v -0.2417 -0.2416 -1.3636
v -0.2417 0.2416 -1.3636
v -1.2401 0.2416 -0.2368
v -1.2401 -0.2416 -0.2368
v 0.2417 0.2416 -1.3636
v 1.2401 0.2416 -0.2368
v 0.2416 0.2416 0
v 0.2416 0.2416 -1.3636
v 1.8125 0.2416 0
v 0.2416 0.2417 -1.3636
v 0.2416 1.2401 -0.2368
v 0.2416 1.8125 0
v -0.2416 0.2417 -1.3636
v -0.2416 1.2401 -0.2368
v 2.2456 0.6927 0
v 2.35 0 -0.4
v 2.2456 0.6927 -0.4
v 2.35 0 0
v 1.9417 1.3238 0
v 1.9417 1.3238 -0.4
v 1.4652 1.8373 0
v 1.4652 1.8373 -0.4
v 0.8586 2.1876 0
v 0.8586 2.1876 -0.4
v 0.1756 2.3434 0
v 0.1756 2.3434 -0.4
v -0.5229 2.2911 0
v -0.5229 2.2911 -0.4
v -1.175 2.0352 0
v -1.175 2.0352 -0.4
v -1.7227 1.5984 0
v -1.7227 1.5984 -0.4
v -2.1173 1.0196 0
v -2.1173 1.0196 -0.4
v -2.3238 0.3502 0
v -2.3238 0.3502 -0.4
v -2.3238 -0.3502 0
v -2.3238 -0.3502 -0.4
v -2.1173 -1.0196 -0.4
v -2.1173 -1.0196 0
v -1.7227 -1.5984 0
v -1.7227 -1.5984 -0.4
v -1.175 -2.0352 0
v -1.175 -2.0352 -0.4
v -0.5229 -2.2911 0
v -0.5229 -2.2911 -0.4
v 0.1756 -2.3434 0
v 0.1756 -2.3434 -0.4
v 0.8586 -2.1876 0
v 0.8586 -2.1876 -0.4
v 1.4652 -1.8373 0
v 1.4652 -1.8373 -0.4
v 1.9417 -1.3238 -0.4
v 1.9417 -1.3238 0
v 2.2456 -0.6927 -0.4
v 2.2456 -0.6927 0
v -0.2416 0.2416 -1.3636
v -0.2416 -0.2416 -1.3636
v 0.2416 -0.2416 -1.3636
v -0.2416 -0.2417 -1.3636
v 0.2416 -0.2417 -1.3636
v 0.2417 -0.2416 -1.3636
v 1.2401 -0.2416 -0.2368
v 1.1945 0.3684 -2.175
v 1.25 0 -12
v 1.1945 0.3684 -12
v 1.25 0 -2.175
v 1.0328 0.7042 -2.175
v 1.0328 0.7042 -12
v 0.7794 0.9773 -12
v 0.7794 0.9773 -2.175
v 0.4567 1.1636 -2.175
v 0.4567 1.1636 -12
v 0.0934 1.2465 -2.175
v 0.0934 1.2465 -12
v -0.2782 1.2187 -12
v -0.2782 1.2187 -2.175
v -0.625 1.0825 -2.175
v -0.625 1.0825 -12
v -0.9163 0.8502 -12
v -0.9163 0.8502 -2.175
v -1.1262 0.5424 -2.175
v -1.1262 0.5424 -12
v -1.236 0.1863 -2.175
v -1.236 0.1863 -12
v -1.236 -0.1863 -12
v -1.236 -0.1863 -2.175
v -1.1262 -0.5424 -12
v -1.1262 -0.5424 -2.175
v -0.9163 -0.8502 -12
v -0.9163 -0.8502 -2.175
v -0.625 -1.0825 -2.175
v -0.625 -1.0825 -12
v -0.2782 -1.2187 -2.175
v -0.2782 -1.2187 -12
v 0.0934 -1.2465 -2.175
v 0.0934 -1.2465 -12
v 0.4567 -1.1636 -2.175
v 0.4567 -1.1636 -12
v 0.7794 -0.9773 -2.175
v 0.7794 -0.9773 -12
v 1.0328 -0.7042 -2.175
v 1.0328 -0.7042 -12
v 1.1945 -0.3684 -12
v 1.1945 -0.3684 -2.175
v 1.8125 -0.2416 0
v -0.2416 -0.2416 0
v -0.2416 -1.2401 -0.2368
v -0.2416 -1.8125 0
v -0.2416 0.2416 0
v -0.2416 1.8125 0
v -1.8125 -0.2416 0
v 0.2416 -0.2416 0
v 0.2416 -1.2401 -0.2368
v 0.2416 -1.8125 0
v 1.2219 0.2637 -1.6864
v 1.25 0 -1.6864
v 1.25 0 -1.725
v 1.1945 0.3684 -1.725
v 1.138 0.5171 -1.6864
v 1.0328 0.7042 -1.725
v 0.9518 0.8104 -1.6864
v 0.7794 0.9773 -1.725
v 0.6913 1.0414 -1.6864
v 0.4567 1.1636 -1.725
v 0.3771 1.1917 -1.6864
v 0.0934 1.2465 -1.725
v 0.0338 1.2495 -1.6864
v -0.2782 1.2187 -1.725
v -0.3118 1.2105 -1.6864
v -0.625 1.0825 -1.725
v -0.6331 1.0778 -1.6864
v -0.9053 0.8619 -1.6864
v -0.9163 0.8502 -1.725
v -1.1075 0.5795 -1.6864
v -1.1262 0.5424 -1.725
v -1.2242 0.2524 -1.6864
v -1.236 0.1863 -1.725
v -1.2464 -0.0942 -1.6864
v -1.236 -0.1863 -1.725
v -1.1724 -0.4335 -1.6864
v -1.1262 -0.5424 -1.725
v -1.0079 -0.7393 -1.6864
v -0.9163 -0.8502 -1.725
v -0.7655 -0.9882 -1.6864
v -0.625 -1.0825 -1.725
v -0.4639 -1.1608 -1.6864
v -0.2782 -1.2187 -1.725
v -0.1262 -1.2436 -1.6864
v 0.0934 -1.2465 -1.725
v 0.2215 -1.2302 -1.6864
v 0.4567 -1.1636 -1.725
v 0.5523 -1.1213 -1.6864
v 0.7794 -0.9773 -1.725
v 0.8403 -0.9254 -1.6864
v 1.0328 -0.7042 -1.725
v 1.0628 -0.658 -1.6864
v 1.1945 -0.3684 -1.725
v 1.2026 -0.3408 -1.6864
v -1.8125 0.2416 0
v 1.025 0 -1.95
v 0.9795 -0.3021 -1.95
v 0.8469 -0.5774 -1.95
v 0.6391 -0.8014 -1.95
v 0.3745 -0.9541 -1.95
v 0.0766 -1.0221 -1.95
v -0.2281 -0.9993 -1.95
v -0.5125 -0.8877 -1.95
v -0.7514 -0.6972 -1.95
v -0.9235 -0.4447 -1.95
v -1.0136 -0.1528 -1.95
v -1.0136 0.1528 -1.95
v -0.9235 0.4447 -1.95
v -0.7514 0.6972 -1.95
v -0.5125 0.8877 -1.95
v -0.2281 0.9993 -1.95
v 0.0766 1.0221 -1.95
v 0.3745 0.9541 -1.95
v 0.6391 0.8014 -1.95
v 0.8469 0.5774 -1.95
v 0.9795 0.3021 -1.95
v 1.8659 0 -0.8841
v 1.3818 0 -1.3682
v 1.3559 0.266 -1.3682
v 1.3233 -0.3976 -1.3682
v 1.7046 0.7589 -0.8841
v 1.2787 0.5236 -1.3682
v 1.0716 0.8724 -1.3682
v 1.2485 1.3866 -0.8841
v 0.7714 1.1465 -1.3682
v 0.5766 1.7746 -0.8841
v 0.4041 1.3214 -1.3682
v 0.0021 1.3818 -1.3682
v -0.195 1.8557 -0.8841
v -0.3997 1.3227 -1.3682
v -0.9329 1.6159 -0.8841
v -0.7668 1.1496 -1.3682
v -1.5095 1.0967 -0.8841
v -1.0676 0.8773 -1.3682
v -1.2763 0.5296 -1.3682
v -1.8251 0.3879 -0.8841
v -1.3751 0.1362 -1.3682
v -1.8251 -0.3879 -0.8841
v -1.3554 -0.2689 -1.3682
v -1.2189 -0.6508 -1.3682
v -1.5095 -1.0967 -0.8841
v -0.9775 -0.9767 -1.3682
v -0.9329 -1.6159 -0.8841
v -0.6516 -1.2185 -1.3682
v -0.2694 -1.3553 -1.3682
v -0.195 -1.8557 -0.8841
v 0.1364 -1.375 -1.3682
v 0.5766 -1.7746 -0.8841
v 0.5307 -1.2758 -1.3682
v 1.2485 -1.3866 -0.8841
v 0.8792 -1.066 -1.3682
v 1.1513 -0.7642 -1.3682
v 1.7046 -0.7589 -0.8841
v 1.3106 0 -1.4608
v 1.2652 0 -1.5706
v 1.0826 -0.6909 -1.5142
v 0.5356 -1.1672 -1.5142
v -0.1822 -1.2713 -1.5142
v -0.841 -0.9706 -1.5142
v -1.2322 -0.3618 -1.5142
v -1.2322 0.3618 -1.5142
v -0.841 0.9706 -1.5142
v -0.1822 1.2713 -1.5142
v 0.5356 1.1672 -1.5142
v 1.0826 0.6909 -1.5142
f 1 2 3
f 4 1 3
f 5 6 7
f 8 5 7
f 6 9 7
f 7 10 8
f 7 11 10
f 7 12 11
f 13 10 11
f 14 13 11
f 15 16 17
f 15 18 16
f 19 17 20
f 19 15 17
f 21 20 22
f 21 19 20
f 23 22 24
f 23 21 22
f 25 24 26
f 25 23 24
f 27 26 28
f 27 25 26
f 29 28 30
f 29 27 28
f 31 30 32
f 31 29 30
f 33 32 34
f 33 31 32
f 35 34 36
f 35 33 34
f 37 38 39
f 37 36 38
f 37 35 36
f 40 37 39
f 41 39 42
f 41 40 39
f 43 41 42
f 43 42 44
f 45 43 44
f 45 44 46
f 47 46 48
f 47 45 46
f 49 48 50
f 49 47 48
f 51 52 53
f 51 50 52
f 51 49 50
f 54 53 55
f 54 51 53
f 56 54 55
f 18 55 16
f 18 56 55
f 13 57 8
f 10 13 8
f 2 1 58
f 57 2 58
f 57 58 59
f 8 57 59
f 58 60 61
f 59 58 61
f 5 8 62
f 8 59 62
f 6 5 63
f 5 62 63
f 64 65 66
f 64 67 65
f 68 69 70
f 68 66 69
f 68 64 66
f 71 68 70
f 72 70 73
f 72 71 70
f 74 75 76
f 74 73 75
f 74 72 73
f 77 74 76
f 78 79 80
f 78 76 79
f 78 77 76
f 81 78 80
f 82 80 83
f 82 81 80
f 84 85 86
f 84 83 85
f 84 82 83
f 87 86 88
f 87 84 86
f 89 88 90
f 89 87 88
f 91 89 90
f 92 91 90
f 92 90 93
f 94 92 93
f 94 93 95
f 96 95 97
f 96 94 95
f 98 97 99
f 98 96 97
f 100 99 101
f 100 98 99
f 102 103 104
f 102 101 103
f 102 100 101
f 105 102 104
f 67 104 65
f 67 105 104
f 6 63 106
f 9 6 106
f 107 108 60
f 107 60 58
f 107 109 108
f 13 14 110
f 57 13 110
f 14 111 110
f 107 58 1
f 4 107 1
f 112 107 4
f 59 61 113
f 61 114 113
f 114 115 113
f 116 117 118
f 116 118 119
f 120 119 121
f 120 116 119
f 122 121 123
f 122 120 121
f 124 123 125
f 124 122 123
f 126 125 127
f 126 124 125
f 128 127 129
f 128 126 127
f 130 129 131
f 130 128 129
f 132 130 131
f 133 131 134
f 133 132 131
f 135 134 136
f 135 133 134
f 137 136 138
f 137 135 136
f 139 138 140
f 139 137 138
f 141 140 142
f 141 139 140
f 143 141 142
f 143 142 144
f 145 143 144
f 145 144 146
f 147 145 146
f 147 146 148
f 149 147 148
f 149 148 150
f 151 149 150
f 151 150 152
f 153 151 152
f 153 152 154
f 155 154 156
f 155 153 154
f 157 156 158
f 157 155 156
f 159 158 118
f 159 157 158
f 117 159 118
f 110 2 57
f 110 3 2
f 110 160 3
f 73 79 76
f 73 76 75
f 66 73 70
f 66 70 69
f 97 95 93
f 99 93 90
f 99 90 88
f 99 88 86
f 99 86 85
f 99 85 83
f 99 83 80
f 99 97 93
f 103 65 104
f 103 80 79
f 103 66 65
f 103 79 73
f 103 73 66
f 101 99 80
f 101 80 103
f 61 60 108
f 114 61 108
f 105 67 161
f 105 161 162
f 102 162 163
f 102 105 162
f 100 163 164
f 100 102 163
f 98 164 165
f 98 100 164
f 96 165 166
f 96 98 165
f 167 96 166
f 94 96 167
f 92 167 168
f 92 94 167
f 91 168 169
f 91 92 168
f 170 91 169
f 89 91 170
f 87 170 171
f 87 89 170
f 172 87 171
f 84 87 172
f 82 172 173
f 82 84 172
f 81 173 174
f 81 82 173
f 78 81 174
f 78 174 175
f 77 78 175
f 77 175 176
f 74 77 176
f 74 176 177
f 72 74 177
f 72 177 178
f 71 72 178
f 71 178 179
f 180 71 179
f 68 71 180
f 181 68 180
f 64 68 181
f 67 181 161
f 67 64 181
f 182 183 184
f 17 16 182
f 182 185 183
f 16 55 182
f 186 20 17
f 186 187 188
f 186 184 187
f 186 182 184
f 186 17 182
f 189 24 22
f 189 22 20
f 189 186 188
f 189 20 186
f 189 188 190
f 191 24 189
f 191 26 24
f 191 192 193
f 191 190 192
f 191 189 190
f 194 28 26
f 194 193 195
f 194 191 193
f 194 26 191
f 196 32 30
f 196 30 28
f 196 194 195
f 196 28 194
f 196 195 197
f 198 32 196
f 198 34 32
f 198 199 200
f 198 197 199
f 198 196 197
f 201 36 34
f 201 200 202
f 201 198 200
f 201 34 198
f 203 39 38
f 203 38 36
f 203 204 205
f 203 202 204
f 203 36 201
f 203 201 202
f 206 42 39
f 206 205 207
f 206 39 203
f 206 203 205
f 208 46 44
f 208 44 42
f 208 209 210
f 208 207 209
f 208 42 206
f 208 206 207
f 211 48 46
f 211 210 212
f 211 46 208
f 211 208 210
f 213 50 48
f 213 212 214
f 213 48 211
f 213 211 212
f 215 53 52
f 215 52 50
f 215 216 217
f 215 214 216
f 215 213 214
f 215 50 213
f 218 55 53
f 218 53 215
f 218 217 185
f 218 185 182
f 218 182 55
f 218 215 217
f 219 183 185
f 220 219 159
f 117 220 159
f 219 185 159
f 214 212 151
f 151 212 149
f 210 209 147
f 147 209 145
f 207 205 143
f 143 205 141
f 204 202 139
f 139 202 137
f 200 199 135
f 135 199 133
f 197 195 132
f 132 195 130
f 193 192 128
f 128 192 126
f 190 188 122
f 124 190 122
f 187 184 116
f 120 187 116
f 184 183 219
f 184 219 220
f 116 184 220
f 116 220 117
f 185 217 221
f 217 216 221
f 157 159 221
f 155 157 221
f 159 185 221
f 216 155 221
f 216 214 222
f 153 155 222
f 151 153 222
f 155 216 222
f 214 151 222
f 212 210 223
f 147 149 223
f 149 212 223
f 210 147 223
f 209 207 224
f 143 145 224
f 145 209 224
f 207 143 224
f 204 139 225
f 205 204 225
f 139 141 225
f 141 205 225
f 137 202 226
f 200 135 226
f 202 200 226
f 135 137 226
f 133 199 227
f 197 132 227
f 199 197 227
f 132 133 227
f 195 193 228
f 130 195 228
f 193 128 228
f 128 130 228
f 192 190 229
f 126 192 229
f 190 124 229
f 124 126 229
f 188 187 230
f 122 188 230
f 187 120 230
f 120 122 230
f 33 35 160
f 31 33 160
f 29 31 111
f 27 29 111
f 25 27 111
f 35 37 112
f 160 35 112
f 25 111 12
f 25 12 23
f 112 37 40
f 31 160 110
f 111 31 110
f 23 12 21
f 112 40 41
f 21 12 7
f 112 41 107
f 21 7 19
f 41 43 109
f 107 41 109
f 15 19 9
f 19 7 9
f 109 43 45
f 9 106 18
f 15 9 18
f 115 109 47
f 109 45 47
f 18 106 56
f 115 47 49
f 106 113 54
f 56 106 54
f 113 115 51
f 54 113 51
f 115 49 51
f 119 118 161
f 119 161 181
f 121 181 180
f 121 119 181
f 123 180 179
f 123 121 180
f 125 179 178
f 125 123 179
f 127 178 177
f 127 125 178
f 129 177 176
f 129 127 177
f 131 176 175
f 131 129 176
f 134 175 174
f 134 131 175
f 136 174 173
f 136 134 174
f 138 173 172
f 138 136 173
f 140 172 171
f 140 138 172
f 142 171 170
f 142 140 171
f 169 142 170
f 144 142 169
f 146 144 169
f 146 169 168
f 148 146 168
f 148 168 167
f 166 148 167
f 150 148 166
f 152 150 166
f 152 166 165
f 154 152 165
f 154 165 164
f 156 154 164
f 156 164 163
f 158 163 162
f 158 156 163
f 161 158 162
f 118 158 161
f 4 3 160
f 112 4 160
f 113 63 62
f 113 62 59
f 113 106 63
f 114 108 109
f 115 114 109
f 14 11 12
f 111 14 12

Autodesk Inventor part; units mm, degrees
ref_plane "YZ Plane" through (0, 0, 0) normal (1, 0, 0) x (0, 1, 0)
sketch "Esquisse1" plane through (0, 0, 0) normal (0, 1, 0) x (-1, 0, 0)
  point P0 (0, 0)
sketch "Esquisse2" plane through (0, 0, 0) normal (0, 0, 1) x (1, 0, 0)
  point P0 (0, 0)
sketch "Esquisse3" plane through (0, 0, 0) normal (0, 0, 1) x (1, 0, 0)
  point P0 (0, 0)
sketch "Esquisse4" plane through (0, 0, 0) normal (0, 1, 0) x (-1, 0, 0)
  line L0 (-2.35, 0) -> (0, 0)
  line L1 (-2.35, -0.4) -> (-2.35, 0)
  line L2 (-1.25, -1.5) -> (-2.35, -0.4)
  line L3 (-1.25, -1.725) -> (-1.25, -1.5)
  line L4 (-1.025, -1.95) -> (-1.25, -1.725)
  line L5 (-1.25, -2.175) -> (-1.025, -1.95)
  line L6 (-1.25, -12) -> (-1.25, -2.175)
  line L7 (0, 0) -> (0, -12)
  line L8 (0, 3.3392) -> (0, -10.7) construction
  line L9 (0, 3.3392) -> (0, -10.7)
  line L10 (0, -15.0678) -> (0, 6.4071) projected
  line L11 (-1.25, -12) -> (0, -12)
  line L12 (0.47, 0) -> (-2.82, 0) projected
  dimension "d3" = 2.35
  dimension "d5" = 0.225
  dimension "d7" = 0.225
  dimension "d9" = 0.225
  dimension "d11" = 1.5
  dimension "d13" = 135
  dimension "d17" = 1.025
  dimension "d19" = 0
  dimension "d51" = 1.25
  dimension "d52" = 12
revolve "Révolution1" add sketch "Esquisse4" angle 360 about axis through (0, 0, 3.3392) along (0, 0, -1)
sketch "Esquisse5" plane through (0, 0, 0) normal (0, 1, 0) x (-1, 0, 0)
  line L0 (-1.45, 0) -> (0, 0)
  line L1 (-0.2417, -1.3636) -> (-1.45, 0)
  line L2 (0, -1.3636) -> (-0.2417, -1.3636)
  line L3 (0, 0) -> (0, -1.3636)
  line L4 (-1.25, -1.5) -> (1.25, -1.5) construction
  line L5 (-2.35, 0) -> (2.35, 0) projected
  line L6 (0, -1.8) -> (0, 0.3) projected
  dimension "d22" = 1.45
  dimension "d24" = 0.2417
  dimension "d26" = 1.3636
extrude "Extrusion1" cut sketch "Esquisse5" along normal mid plane 0.4833
pattern_circular "RéseauPolaire1" count 4 over 360 about axis through (0, 0, 0) along (0, 0, 1) of "Extrusion1"
sketch "Esquisse7" plane through (0, 0, 0) normal (0, 1, 0) x (-1, 0, 0)
  line L0 (0, -0.75) -> (-1.8125, 0)
  line L1 (0, 0) -> (0, -0.75)
  line L2 (-1.8125, 0) -> (0, 0)
  line L3 (-1.25, -1.5) -> (1.25, -1.5) construction
  line L4 (0, -1.8) -> (0, 0.3) projected
  line L5 (-2.35, 0) -> (2.35, 0) projected
  dimension "d33" = 1.8125
  dimension "d35" = 0.75
extrude "Extrusion2" cut sketch "Esquisse7" along normal mid plane 0.4833
pattern_circular "RéseauPolaire2" count 4 over 360 about axis through (0, 0, 0) along (0, 0, 1) of "Extrusion2"
fillet "Congé1" radius 0.45 1 edges at (-1.25, 0, -1.5)
thread "Filetage1" size "M2.5x0.45" class "6g" standard "ISO Metric profile" full length
ref_plane "MSC_PF1" through (0, 0, 0) normal (1, 0, 0) x (0, 1, 0)
ref_plane "MSC_PT1" through (0, 0, 0) normal (0, 0, -1) x (-1, 0, 0)
equation "\"d3\" = 0.5 * Dh"
equation "\"d5\" = msp_x"
equation "\"d7\" = ParA"
equation "\"d9\" = msp_x"
equation "\"d11\" = ParK"
equation "\"d17\" = 0.5 * msp_mdtds"
equation "\"d51\" = 0.5 * NND"
equation "\"d52\" = NLG"
equation "\"d22\" = 0.5 * M"
equation "\"d24\" = 0.0833333 * M"
equation "\"d26\" = 0.909091 * ParK"
equation "\"d27\" = 0.166667 * M"
equation "\"d33\" = 0.625 * M"
equation "\"d35\" = 0.5 * ParK"
equation "\"d36\" = 0.166667 * M"
equation "\"d41\" = 2 * msp_x"
equation "\"PTC\" = 0.45"
equation "\"NLG\" = 12"
equation "\"ParK\" = 1.5"
equation "\"NND\" = 2.5"
equation "\"M\" = 2.9"
equation "\"msp_mdtds\" = NND - PTC"
equation "\"Dh\" = 4.7"
equation "\"msp_x\" = 0.5 * PTC"
equation "\"ParA\" = 0.5 * PTC"
equation "\"r\" = 0.6"
equation "\"THREADDIA\" = NND"
equation "\"TEMPLATE\" = 1.2345"
properties part number "NF EN ISO 7046-2 H - M2.5x12 - 8.8 - H1" material "Acier inoxydable 440C"
